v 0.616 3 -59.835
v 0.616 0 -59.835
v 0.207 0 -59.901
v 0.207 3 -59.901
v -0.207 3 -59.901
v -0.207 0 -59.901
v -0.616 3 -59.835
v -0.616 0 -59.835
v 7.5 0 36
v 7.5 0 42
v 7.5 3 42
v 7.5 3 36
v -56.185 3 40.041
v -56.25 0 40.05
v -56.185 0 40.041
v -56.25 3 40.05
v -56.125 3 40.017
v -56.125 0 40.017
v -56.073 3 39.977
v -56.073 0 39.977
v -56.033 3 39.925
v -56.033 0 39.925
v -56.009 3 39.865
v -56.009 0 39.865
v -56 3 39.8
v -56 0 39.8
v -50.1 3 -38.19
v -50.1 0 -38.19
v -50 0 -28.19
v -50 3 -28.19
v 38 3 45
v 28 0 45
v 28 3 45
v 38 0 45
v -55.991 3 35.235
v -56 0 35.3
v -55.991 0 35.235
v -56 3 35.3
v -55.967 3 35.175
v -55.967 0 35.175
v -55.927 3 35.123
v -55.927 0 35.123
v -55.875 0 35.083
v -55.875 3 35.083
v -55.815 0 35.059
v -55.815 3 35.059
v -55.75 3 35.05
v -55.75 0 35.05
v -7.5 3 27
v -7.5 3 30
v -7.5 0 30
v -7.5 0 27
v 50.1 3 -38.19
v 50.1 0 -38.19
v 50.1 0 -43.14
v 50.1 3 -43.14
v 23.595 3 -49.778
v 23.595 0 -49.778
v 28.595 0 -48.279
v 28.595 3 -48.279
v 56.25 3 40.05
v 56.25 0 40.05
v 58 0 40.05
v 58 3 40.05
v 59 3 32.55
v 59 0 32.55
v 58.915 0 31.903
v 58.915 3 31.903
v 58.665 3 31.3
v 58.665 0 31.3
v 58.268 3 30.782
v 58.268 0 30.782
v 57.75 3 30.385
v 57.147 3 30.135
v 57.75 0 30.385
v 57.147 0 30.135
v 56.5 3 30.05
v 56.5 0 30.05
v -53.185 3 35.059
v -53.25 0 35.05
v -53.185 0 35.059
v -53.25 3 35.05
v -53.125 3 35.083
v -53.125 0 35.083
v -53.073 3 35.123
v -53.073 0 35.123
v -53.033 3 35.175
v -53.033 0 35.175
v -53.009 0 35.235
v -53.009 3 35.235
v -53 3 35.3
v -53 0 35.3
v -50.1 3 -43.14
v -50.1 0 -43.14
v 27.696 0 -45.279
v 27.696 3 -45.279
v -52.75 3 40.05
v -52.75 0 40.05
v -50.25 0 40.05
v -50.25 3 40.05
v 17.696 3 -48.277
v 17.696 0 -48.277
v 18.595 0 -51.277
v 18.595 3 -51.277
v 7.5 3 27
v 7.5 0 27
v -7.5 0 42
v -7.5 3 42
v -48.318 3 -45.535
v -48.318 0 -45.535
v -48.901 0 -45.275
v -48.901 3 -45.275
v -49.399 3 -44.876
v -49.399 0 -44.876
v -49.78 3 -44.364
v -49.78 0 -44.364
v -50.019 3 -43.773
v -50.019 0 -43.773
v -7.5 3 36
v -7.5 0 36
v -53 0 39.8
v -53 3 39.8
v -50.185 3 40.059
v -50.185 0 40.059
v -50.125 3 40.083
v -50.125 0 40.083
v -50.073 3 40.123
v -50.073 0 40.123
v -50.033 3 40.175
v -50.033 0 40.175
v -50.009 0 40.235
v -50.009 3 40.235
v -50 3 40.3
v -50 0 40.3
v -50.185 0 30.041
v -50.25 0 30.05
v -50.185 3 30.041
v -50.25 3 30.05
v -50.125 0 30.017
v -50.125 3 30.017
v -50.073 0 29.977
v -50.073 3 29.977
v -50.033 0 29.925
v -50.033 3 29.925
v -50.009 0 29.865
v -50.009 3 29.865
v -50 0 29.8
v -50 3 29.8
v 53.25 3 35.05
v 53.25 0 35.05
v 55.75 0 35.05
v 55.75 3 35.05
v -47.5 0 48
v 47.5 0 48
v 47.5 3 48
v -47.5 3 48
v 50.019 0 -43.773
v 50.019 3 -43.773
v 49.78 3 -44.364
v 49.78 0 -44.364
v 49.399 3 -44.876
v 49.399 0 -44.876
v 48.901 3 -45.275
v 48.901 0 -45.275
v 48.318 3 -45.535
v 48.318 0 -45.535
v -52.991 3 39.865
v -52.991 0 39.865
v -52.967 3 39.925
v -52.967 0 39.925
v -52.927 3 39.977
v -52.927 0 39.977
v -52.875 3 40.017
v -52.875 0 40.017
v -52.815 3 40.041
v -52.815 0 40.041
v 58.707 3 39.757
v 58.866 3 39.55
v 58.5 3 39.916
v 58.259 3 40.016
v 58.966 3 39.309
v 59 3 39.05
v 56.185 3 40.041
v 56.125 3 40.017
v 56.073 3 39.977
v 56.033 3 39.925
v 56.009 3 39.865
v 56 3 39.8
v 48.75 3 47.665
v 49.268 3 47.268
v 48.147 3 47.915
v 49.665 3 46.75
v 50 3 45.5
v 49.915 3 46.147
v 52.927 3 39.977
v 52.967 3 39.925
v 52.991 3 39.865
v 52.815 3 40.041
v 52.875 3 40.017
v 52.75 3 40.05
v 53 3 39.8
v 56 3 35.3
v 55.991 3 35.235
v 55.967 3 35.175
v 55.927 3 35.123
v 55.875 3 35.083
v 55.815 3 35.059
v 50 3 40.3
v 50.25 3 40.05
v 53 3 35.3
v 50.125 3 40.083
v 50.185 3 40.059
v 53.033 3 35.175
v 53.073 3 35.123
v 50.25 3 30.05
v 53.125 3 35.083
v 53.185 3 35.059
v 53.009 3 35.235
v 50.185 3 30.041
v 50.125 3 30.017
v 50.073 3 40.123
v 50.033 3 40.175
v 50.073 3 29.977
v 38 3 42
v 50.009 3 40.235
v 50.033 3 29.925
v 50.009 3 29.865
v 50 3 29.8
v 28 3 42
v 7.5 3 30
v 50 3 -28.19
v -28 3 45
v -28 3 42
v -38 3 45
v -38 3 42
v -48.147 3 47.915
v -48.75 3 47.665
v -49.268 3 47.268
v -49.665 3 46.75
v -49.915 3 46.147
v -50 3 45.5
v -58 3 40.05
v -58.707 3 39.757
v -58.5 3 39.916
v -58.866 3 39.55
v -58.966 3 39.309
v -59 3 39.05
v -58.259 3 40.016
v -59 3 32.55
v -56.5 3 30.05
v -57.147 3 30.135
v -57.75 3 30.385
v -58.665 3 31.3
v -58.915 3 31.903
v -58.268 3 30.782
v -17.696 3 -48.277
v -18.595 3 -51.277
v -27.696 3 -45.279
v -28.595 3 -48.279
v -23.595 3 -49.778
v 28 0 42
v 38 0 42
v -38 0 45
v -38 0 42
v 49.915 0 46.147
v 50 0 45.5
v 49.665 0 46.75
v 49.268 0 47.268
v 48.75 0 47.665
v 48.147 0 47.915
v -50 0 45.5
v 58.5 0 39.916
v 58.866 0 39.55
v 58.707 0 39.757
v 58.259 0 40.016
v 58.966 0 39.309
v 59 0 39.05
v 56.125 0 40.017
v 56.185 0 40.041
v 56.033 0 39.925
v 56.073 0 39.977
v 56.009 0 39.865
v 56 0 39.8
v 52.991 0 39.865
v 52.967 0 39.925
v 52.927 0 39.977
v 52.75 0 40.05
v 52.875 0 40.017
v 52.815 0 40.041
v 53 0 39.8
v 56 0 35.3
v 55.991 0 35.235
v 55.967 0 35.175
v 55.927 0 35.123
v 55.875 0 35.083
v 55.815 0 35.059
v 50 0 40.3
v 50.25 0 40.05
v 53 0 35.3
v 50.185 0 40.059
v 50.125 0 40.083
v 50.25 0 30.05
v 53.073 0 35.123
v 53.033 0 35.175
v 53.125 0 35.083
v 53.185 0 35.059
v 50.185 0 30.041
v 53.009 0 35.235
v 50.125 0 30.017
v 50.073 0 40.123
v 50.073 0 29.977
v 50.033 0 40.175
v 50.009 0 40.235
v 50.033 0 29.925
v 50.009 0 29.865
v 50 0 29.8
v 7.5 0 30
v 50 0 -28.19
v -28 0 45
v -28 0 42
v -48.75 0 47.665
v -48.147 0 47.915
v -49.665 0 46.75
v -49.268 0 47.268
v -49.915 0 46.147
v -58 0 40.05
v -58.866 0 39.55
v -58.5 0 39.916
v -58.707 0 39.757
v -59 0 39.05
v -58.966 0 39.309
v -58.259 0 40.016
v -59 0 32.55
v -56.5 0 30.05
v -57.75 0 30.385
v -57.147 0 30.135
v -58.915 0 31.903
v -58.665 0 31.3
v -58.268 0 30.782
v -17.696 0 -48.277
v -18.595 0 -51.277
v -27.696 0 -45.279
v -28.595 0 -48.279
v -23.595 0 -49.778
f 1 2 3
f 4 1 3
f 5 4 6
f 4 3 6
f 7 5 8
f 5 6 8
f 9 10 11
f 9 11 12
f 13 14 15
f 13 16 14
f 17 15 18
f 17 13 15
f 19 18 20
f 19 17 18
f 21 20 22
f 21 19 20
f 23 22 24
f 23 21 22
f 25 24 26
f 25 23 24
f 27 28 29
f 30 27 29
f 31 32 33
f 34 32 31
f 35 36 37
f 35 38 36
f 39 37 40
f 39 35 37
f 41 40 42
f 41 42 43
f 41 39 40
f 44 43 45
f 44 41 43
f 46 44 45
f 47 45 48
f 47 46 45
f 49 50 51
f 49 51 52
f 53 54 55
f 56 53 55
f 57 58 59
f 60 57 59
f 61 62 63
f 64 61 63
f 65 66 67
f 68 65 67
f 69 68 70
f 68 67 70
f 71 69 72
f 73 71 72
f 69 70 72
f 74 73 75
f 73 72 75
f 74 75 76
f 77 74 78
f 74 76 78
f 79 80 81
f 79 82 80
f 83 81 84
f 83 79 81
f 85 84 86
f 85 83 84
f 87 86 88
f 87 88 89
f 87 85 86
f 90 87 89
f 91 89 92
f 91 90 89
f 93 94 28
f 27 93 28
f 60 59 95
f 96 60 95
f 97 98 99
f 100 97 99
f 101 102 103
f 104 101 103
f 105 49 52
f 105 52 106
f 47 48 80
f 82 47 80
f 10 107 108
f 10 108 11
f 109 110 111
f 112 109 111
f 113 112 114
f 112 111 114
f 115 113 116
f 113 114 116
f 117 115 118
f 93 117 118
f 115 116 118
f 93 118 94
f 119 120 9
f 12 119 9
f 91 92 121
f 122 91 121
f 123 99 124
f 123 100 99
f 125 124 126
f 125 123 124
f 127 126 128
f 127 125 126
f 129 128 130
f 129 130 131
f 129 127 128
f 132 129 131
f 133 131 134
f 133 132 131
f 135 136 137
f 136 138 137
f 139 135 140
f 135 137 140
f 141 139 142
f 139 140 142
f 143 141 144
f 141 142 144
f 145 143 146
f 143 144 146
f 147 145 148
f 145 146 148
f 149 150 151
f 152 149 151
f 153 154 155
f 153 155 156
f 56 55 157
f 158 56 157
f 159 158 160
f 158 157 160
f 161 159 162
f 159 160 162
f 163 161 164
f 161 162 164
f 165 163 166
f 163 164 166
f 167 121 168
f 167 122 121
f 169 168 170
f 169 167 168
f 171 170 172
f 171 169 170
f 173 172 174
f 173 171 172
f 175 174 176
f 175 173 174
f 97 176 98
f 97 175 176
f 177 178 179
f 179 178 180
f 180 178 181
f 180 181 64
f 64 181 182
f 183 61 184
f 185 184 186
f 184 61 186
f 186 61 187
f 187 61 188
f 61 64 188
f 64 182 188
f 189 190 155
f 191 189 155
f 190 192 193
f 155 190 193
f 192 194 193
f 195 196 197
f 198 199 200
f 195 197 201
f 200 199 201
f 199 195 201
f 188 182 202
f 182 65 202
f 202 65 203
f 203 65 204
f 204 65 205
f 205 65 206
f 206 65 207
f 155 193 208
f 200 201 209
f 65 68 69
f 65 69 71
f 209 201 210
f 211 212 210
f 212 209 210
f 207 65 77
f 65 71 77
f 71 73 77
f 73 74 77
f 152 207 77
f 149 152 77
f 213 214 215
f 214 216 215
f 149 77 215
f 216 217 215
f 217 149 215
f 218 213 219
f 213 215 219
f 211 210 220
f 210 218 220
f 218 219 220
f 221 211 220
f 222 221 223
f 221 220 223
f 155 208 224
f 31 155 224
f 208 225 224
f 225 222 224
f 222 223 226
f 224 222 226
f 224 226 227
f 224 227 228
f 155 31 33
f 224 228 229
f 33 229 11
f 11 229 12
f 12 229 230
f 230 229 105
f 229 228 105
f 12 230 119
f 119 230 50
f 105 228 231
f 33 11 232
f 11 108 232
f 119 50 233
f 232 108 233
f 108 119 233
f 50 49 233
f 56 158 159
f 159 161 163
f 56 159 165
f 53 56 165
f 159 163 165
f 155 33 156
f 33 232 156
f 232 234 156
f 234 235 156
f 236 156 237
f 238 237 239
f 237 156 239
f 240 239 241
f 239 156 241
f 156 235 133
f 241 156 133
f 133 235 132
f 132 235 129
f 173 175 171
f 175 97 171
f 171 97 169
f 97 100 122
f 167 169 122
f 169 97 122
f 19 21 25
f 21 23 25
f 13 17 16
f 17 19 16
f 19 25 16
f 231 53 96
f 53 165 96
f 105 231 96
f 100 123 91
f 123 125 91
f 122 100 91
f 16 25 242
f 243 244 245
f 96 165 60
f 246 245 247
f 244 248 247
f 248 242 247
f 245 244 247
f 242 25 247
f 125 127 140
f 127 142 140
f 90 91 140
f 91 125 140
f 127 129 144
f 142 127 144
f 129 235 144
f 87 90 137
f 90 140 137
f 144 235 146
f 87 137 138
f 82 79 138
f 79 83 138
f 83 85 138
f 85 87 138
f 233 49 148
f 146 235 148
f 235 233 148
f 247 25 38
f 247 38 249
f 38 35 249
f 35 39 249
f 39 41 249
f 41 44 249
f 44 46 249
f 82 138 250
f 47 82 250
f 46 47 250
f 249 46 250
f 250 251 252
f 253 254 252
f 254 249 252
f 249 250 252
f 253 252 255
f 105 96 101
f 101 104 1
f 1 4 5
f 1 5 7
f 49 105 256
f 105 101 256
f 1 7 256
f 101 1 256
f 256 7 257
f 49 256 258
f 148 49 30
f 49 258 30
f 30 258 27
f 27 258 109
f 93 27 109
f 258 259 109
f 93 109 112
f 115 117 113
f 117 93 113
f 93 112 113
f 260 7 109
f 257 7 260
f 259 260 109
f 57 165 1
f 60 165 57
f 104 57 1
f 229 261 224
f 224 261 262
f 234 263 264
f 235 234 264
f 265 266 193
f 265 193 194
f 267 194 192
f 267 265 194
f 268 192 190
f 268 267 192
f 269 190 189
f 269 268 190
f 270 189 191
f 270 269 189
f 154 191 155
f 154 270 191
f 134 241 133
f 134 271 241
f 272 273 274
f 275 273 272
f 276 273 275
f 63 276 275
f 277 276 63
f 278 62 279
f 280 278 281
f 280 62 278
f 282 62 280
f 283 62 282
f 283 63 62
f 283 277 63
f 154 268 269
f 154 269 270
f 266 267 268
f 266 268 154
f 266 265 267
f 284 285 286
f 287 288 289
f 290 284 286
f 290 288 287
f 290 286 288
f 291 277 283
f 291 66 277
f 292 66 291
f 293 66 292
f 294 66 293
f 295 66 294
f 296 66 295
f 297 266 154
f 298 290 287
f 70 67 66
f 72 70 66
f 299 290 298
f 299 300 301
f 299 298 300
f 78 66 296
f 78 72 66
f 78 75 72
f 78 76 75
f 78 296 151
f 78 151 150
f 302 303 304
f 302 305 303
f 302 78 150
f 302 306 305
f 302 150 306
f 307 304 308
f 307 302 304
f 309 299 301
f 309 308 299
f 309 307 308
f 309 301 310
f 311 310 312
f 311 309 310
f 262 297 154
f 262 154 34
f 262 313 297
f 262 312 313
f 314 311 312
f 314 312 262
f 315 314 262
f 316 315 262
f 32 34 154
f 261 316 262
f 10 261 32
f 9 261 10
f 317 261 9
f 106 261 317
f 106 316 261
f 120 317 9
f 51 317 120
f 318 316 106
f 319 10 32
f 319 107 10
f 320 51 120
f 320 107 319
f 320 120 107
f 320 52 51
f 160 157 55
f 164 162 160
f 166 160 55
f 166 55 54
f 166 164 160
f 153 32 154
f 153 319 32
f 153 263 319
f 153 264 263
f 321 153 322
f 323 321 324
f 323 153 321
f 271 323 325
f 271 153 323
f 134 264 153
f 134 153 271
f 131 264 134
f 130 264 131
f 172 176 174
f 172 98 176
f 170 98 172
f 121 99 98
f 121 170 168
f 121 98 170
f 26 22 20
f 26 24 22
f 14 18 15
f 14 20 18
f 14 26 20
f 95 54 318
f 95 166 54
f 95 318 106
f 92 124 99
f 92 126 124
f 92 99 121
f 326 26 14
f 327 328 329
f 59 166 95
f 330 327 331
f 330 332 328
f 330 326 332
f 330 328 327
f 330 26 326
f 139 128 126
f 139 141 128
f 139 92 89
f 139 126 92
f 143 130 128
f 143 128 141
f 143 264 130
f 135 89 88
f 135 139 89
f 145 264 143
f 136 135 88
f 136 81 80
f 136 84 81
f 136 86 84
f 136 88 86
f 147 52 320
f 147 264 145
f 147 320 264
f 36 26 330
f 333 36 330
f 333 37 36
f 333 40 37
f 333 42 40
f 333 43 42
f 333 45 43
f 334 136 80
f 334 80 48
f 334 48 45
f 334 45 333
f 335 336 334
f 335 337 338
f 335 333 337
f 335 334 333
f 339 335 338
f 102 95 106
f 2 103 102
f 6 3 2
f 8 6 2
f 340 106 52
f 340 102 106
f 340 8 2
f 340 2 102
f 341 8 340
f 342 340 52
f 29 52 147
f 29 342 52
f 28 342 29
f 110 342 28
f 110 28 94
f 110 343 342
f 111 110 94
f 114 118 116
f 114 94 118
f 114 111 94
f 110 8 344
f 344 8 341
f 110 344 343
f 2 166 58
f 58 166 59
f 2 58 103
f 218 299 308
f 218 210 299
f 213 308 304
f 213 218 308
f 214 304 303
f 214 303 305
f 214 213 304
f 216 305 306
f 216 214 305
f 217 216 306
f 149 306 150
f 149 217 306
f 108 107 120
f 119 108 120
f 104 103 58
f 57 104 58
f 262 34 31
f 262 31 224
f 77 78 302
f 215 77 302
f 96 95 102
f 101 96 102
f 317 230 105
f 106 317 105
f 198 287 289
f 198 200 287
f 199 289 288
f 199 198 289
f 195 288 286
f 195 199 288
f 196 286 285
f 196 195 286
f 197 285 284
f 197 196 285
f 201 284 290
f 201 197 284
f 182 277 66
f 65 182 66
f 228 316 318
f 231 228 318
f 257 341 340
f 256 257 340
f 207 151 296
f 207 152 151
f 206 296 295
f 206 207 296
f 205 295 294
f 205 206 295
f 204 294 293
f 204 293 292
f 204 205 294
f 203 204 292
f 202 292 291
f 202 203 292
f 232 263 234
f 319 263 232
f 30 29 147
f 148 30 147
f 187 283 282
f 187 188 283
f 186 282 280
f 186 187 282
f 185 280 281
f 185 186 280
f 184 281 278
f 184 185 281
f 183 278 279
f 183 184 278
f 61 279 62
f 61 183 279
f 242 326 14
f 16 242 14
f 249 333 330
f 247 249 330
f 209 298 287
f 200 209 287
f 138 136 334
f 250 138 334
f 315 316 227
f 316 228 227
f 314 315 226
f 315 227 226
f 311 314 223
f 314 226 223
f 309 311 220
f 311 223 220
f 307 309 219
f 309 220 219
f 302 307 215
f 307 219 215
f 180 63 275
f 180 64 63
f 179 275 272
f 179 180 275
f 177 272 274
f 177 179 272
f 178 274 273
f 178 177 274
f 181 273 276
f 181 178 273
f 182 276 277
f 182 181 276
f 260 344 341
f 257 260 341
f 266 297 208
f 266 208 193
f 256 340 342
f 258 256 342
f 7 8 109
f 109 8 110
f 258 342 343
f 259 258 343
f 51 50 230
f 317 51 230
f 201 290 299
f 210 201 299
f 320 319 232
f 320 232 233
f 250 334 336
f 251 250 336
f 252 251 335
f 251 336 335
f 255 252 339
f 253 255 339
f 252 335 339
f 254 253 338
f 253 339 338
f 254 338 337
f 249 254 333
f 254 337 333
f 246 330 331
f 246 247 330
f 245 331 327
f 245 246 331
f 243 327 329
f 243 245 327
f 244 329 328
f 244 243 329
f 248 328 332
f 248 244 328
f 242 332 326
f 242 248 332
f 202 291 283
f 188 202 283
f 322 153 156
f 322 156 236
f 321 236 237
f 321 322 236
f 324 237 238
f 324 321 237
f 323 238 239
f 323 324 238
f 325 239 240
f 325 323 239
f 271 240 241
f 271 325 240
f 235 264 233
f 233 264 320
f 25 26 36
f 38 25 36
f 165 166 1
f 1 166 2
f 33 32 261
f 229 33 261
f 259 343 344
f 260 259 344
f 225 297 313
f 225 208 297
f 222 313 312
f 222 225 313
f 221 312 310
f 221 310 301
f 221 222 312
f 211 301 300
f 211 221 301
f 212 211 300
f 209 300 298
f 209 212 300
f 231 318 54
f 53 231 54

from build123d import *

# Parameters (mm, degrees)
SALIENTE_EXTRUIR1_DEPTH = 3
CROQUIS4_W              = 15
CROQUIS4_H              = 6
CROQUIS4_W_2            = 10
CROQUIS4_H_2            = 3
CORTAR_EXTRUIR1_DEPTH   = 3
SALIENTE_EXTRUIR2_DEPTH = 3
REDONDEO1_R             = 1
REDONDEO2_R             = 0.25


with BuildPart() as part:
    # Croquis3 → Saliente-Extruir1 (new body)
    with BuildSketch(Plane(origin=(0, 0, 0), x_dir=(1, 0, 0), z_dir=(0, 1, 0))):
        with BuildLine():
            Line((-50, -45), (50, -45))
            Line((50, -45), (50, -40.05))
            Line((50, -40.05), (53, -40.05))
            Line((53, -40.05), (53, -35.05))
            Line((53, -35.05), (56, -35.05))
            Line((56, -35.05), (56, -40.05))
            Line((56, -40.05), (59, -40.05))
            Line((59, -40.05), (59, -32.55))
            ThreePointArc((59, -32.55), (58.267766953, -30.782233047), (56.5, -30.05))
            Line((56.5, -30.05), (50, -30.05))
            Line((50, -30.05), (50, 28.189923373))
            Line((50, 28.189923373), (50.1, 38.189923373))
            Line((50.1, 38.189923373), (50.1, 43.139923373))
            ThreePointArc((50.1, 43.139923373), (49.605586306, 44.632445926), (48.317901143, 45.534629607))
            Line((48.317901143, 45.534629607), (0.615531773, 59.835166775))
            ThreePointArc((0.615531773, 59.835166775), (0, 59.908733938), (-0.615531773, 59.835166775))
            Line((-0.615531773, 59.835166775), (-48.317901143, 45.534629607))
            ThreePointArc((-48.317901143, 45.534629607), (-49.605586306, 44.632445926), (-50.1, 43.139923373))
            Line((-50.1, 43.139923373), (-50.1, 38.189923373))
            Line((-50.1, 38.189923373), (-50, 28.189923373))
            Line((-50, 28.189923373), (-50, -30.05))
            Line((-50, -30.05), (-56.5, -30.05))
            ThreePointArc((-56.5, -30.05), (-58.267766953, -30.782233047), (-59, -32.55))
            Line((-59, -32.55), (-59, -40.05))
            Line((-59, -40.05), (-56, -40.05))
            Line((-56, -40.05), (-56, -35.05))
            Line((-56, -35.05), (-53, -35.05))
            Line((-53, -35.05), (-53, -40.05))
            Line((-53, -40.05), (-50, -40.05))
            Line((-50, -40.05), (-50, -45))
        make_face()
        Polygon((-23.595339952, 49.778243466), (-18.595339952, 51.277177099), (-17.695979772, 48.277177099), (-27.695979772, 45.279309832), (-28.595339952, 48.279309832), align=None, mode=Mode.SUBTRACT)
        Polygon((28.595339952, 48.279309832), (27.695979772, 45.279309832), (17.695979772, 48.277177099), (18.595339952, 51.277177099), (23.595339952, 49.778243466), align=None, mode=Mode.SUBTRACT)
    extrude(amount=SALIENTE_EXTRUIR1_DEPTH)

    # Croquis4 → Cortar-Extruir1 (cut, symmetric)
    with BuildSketch(Plane(origin=(0, 3, 0), x_dir=(1, 0, 0), z_dir=(0, 1, 0))):
        with Locations((0, -39)):
            Rectangle(CROQUIS4_W, CROQUIS4_H)
        with Locations((-33, -43.5)):
            Rectangle(CROQUIS4_W_2, CROQUIS4_H_2)
        with Locations((33, -43.5)):
            Rectangle(CROQUIS4_W_2, CROQUIS4_H_2)
        with Locations((0, -28.5)):
            Rectangle(CROQUIS4_W, CROQUIS4_H_2)
    extrude(amount=CORTAR_EXTRUIR1_DEPTH, both=True, mode=Mode.SUBTRACT)

    # Croquis5 → Saliente-Extruir2 (add)
    with BuildSketch(Plane(origin=(0, 0, 0), x_dir=(1, 0, 0), z_dir=(0, 1, 0))):
        with BuildLine():
            Line((-50, -45), (50, -45))
            Line((50, -45), (50, -45.5))
            ThreePointArc((50, -45.5), (49.267766953, -47.267766953), (47.5, -48))
            Line((47.5, -48), (-47.5, -48))
            ThreePointArc((-47.5, -48), (-49.267766953, -47.267766953), (-50, -45.5))
            Line((-50, -45.5), (-50, -45))
        make_face()
    extrude(amount=SALIENTE_EXTRUIR2_DEPTH)

    # Redondeo1
    redondeo1_edges = [part.edges().sort_by_distance(p)[0] for p in [
        (-59, 1.5, 40.05),
        (59, 1.5, 40.05),
    ]]
    fillet(redondeo1_edges, radius=REDONDEO1_R)

    # Redondeo2
    redondeo2_edges = [part.edges().sort_by_distance(p)[0] for p in [
        (-50, 1.5, 40.05),
        (-53, 1.5, 40.05),
        (-53, 1.5, 35.05),
        (-56, 1.5, 35.05),
        (-56, 1.5, 40.05),
        (-50, 1.5, 30.05),
        (50, 1.5, 30.05),
        (56, 1.5, 40.05),
        (56, 1.5, 35.05),
        (53, 1.5, 35.05),
        (53, 1.5, 40.05),
        (50, 1.5, 40.05),
    ]]
    fillet(redondeo2_edges, radius=REDONDEO2_R)


solid = part.part
